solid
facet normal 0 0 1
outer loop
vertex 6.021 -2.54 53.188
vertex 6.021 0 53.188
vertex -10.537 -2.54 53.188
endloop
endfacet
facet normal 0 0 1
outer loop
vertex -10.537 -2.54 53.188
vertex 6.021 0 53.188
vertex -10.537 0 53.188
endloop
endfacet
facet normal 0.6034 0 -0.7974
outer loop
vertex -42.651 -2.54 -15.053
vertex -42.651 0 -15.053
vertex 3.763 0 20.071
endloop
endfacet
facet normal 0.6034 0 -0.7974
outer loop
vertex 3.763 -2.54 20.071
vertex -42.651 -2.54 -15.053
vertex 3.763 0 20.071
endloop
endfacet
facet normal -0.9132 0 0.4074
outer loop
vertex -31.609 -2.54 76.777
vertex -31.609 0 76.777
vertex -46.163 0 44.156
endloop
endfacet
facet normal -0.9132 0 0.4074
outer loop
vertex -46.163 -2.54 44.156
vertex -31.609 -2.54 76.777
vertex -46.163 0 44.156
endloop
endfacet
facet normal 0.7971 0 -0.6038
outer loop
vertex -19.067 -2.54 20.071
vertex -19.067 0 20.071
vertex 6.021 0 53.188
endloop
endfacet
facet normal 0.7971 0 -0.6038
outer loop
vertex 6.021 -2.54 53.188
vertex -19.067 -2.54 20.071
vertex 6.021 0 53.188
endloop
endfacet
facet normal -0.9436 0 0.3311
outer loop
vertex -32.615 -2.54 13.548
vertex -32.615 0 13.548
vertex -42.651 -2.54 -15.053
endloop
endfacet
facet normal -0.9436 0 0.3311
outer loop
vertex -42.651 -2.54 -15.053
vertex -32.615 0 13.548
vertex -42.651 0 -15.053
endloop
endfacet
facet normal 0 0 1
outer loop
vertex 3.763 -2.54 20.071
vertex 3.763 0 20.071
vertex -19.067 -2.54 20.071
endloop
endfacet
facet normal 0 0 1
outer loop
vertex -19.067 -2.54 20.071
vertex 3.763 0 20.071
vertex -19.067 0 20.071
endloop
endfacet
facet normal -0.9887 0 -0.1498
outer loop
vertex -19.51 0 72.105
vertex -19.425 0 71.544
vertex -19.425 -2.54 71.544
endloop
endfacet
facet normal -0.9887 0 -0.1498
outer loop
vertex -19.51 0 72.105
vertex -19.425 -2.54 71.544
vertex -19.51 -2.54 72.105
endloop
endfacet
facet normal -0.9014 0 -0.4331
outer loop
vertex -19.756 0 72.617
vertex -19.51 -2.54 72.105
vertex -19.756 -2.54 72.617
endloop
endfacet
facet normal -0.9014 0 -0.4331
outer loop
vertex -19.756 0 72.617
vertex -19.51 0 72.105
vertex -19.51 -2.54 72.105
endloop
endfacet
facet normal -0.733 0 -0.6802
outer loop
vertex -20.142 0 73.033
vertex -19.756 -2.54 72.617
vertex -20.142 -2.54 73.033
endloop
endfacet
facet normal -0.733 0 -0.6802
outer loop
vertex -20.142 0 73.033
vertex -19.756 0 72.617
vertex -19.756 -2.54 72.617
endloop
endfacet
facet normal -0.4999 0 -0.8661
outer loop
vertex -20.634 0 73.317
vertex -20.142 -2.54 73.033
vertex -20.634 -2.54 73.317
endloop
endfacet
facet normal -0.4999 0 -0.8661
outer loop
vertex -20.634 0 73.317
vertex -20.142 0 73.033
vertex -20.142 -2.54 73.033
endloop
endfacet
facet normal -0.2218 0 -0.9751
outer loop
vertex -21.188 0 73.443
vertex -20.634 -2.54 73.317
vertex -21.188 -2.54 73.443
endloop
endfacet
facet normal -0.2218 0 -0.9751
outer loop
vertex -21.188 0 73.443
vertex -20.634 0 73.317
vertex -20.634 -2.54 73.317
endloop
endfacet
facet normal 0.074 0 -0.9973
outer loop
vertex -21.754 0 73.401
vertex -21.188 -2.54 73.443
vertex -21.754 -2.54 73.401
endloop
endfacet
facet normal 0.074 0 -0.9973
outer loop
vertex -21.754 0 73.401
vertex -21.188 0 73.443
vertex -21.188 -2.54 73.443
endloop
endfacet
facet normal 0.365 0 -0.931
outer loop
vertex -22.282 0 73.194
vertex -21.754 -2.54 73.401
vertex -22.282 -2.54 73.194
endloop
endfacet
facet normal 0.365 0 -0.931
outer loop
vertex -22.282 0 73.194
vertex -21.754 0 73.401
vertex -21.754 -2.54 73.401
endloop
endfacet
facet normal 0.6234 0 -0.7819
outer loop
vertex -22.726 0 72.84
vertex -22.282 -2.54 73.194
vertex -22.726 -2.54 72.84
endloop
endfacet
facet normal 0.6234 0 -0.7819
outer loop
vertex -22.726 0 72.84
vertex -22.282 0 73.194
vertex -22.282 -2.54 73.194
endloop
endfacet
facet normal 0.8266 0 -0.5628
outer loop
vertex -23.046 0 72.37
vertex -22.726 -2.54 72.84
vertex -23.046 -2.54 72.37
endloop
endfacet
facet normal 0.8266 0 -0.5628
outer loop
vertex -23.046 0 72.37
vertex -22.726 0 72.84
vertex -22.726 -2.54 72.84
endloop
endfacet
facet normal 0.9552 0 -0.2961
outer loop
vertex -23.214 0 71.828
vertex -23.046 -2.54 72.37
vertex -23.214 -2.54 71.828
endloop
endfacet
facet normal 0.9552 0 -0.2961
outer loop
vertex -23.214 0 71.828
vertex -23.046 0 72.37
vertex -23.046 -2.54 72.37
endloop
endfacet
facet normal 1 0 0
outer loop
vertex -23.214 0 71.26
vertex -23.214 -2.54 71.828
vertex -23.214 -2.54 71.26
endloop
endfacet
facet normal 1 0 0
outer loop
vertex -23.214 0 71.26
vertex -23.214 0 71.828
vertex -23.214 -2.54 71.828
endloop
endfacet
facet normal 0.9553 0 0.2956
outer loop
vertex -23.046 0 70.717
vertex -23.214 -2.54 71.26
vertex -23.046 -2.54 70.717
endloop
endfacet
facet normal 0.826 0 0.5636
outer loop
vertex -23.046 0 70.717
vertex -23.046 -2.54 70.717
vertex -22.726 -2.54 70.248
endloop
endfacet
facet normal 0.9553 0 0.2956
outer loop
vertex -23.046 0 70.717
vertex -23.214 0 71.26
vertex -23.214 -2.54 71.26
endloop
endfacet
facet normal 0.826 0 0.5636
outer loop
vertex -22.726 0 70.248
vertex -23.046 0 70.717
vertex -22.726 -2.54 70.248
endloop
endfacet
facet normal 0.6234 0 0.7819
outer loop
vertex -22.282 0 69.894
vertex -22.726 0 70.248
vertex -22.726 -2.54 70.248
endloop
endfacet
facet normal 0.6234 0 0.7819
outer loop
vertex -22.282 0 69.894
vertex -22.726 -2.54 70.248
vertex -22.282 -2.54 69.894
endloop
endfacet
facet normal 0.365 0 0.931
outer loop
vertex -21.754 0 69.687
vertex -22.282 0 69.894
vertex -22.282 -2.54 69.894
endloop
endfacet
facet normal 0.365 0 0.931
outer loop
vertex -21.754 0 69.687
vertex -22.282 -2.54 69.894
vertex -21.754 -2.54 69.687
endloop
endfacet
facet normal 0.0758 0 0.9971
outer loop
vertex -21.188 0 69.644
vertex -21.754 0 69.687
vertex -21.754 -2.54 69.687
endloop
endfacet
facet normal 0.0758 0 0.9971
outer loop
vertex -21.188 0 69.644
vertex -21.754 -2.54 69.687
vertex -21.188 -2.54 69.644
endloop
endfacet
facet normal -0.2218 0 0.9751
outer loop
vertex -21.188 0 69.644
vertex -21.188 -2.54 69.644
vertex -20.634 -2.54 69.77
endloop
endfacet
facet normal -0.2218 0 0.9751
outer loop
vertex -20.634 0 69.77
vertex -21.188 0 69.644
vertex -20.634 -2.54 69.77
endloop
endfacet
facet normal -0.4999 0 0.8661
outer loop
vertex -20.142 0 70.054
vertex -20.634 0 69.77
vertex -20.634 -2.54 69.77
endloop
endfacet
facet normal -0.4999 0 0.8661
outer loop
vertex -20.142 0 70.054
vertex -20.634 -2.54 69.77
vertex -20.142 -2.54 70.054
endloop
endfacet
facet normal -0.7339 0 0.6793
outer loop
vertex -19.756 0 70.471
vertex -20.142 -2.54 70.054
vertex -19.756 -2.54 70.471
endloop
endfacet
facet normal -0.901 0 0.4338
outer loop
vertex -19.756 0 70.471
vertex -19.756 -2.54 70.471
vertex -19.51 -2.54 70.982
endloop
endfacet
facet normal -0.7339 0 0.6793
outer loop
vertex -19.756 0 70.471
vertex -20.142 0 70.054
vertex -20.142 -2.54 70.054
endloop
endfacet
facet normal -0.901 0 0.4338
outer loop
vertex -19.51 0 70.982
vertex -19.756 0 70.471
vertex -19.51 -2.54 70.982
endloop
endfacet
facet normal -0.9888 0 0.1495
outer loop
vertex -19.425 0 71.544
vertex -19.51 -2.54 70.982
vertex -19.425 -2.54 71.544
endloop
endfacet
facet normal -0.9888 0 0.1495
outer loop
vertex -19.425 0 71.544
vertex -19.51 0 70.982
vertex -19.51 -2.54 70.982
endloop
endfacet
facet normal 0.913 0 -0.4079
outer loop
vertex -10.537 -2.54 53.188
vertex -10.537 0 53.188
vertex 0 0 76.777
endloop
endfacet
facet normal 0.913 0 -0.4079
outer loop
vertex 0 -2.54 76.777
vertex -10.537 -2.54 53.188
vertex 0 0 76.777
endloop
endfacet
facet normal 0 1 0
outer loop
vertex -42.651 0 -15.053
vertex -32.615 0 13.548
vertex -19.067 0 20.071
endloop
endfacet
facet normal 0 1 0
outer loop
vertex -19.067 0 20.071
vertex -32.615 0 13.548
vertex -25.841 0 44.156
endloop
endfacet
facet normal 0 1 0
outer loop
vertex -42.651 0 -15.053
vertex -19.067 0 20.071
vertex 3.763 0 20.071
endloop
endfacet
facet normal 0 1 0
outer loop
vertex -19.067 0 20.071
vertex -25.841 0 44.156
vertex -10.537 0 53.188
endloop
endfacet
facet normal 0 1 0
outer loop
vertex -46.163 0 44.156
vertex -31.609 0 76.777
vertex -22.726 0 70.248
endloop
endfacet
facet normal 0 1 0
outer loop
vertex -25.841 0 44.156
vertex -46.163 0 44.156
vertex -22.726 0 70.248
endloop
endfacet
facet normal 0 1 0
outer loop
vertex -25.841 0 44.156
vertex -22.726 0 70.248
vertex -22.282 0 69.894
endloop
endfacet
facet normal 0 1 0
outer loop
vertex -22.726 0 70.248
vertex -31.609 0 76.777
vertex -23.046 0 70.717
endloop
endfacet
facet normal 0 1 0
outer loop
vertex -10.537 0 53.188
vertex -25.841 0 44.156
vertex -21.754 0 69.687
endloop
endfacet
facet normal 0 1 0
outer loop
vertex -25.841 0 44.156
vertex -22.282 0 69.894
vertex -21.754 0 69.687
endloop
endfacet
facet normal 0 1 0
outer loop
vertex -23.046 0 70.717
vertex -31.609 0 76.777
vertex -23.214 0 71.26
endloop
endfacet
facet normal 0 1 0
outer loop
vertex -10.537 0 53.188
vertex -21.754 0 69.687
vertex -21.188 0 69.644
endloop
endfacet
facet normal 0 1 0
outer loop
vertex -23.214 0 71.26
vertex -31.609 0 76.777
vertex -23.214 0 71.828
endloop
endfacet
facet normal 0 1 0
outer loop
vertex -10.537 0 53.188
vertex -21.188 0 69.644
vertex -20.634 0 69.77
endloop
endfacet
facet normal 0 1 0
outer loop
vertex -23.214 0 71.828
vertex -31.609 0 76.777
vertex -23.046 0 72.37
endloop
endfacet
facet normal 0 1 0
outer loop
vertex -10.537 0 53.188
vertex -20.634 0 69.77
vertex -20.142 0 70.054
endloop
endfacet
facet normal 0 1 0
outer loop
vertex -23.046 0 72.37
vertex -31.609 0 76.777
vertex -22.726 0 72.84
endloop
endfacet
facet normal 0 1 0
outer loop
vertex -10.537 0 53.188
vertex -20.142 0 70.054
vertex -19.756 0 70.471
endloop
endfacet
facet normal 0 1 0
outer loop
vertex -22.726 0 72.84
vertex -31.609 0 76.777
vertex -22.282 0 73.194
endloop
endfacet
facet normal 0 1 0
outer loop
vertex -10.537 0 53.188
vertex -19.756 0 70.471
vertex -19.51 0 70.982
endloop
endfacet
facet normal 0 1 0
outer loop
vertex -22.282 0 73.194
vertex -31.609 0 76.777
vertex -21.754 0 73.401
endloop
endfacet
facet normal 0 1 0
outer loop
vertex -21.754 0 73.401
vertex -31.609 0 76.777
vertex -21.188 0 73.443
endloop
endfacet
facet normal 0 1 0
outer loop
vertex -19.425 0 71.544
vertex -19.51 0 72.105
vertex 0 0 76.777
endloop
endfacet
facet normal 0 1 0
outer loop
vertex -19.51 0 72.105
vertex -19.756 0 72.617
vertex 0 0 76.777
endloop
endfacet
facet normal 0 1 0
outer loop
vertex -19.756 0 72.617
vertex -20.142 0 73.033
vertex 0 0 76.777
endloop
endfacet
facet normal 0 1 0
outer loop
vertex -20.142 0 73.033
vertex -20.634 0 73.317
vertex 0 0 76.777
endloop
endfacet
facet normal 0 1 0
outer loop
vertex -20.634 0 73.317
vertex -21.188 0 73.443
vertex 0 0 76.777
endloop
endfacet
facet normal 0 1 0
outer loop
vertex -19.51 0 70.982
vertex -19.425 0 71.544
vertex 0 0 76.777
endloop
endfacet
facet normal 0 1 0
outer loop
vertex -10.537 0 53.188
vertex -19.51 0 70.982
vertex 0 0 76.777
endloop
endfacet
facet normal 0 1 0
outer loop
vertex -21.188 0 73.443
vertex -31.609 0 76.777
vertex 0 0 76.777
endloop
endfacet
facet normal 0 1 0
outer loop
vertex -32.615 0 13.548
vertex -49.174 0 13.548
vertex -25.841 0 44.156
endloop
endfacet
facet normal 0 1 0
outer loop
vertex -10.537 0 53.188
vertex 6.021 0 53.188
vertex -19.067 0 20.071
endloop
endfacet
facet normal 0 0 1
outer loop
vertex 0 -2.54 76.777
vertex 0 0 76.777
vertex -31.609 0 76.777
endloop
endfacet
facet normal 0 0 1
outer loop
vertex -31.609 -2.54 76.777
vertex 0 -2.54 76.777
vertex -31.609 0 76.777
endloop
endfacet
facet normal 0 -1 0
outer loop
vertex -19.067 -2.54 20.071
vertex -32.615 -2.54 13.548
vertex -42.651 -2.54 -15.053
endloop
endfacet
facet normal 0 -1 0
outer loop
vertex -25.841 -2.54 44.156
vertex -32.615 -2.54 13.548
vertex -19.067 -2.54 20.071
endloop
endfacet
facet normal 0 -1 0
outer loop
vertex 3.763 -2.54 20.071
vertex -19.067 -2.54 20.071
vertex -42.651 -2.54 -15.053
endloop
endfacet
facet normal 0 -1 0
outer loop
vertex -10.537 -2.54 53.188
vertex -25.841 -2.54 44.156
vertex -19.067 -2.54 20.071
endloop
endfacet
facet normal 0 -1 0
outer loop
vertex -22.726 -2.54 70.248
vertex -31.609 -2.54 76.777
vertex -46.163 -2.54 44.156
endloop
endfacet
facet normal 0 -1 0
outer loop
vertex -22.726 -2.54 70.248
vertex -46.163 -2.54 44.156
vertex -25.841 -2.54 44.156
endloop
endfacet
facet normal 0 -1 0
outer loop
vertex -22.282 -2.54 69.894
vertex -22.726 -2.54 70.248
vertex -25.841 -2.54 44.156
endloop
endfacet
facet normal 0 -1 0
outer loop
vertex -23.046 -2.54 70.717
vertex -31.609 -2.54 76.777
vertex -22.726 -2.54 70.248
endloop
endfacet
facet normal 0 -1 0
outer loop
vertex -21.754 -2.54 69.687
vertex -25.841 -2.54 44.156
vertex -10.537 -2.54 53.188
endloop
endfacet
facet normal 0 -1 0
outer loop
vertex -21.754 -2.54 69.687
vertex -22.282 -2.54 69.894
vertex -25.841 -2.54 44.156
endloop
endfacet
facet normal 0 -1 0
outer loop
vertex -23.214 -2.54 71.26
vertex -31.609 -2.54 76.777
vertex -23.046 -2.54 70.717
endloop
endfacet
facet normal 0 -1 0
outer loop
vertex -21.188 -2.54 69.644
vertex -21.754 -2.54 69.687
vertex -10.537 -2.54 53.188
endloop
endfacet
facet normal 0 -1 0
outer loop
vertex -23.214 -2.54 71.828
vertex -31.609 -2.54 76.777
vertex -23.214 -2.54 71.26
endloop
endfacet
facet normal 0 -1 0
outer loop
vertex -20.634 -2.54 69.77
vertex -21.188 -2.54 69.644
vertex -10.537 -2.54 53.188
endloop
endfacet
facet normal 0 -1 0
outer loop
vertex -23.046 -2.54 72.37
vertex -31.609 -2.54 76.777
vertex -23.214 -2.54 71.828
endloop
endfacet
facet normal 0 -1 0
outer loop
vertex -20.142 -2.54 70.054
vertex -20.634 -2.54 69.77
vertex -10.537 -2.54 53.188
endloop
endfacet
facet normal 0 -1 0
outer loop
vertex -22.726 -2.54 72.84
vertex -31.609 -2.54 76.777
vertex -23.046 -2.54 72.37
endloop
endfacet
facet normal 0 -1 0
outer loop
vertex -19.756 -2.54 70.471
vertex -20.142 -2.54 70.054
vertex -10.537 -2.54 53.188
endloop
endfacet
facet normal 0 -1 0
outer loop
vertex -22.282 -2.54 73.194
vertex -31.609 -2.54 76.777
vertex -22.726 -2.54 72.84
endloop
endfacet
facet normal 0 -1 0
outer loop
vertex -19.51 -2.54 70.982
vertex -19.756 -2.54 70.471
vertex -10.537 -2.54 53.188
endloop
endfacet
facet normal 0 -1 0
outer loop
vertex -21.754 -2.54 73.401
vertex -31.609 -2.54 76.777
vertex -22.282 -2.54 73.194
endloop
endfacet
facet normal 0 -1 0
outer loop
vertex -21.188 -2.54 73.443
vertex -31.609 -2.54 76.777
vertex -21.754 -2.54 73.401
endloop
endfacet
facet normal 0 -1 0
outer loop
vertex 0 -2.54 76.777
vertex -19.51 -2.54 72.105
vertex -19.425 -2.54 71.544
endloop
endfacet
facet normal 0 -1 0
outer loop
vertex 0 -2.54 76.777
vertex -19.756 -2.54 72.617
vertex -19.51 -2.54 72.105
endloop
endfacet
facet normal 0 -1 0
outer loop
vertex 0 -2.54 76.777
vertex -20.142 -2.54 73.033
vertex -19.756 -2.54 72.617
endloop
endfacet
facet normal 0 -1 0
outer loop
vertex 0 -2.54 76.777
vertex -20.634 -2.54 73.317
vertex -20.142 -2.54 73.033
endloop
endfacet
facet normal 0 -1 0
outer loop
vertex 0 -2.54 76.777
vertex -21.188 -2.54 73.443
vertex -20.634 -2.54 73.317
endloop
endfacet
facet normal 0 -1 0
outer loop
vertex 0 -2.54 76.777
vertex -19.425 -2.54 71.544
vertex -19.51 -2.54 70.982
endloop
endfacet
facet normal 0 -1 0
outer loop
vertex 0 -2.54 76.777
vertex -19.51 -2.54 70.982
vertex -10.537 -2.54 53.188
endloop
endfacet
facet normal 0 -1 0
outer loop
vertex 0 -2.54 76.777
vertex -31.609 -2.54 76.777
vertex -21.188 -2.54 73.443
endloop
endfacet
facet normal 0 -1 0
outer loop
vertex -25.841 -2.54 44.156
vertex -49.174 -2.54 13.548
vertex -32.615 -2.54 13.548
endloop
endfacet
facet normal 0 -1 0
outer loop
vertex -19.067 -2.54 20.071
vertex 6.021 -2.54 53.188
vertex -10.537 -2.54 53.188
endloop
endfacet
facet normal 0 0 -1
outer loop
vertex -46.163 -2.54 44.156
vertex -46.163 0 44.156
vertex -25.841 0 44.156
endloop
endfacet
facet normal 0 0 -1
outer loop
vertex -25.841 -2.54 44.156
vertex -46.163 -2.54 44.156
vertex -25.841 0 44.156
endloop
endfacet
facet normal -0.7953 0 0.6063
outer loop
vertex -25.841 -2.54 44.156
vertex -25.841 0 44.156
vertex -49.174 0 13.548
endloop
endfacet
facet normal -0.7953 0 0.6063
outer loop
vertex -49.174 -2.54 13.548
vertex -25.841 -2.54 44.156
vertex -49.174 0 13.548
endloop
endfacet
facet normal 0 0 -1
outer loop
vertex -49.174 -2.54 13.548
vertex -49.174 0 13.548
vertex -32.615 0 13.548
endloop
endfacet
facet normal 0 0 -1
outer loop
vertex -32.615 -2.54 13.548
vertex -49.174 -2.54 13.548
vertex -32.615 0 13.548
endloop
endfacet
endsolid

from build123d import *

# Parameters (mm, degrees)
F0_R     = 1.905
F1_DEPTH = 2.54
F2_DEPTH = 152


# Not quite as in the source:
# - an extrude ends at something that could not be found from the text; its depth is read off the source's solid


with BuildPart() as f1:
    # F0 (on Front) → F1 (new body)
    with BuildSketch(Plane.XZ):
        Polygon((-10.5372872204, 53.1882047653), (0, 76.7774991782), (-31.6092483094, 76.7774991782), (-46.1633428931, 44.156242162), (-25.8414391428, 44.156242162), (-49.1739995778, 13.5479401797), (-32.6154083014, 13.5479401797), (-42.6509156823, -15.0532610714), (3.763313638, 20.0710203499), (-19.0674699843, 20.0710203499), (6.0213026591, 53.1882047653), align=None)
        with Locations((-21.3299991501, 71.5437866839)):
            Circle(F0_R, mode=Mode.SUBTRACT)
    extrude(amount=F1_DEPTH)

    # F0 (on Front) → F2 (cut, through all)
    with BuildSketch(Plane.XZ):
        with Locations((-21.3299991501, 71.5437866839)):
            Circle(F0_R)
    extrude(amount=-F2_DEPTH, mode=Mode.SUBTRACT)


solid = f1.part
